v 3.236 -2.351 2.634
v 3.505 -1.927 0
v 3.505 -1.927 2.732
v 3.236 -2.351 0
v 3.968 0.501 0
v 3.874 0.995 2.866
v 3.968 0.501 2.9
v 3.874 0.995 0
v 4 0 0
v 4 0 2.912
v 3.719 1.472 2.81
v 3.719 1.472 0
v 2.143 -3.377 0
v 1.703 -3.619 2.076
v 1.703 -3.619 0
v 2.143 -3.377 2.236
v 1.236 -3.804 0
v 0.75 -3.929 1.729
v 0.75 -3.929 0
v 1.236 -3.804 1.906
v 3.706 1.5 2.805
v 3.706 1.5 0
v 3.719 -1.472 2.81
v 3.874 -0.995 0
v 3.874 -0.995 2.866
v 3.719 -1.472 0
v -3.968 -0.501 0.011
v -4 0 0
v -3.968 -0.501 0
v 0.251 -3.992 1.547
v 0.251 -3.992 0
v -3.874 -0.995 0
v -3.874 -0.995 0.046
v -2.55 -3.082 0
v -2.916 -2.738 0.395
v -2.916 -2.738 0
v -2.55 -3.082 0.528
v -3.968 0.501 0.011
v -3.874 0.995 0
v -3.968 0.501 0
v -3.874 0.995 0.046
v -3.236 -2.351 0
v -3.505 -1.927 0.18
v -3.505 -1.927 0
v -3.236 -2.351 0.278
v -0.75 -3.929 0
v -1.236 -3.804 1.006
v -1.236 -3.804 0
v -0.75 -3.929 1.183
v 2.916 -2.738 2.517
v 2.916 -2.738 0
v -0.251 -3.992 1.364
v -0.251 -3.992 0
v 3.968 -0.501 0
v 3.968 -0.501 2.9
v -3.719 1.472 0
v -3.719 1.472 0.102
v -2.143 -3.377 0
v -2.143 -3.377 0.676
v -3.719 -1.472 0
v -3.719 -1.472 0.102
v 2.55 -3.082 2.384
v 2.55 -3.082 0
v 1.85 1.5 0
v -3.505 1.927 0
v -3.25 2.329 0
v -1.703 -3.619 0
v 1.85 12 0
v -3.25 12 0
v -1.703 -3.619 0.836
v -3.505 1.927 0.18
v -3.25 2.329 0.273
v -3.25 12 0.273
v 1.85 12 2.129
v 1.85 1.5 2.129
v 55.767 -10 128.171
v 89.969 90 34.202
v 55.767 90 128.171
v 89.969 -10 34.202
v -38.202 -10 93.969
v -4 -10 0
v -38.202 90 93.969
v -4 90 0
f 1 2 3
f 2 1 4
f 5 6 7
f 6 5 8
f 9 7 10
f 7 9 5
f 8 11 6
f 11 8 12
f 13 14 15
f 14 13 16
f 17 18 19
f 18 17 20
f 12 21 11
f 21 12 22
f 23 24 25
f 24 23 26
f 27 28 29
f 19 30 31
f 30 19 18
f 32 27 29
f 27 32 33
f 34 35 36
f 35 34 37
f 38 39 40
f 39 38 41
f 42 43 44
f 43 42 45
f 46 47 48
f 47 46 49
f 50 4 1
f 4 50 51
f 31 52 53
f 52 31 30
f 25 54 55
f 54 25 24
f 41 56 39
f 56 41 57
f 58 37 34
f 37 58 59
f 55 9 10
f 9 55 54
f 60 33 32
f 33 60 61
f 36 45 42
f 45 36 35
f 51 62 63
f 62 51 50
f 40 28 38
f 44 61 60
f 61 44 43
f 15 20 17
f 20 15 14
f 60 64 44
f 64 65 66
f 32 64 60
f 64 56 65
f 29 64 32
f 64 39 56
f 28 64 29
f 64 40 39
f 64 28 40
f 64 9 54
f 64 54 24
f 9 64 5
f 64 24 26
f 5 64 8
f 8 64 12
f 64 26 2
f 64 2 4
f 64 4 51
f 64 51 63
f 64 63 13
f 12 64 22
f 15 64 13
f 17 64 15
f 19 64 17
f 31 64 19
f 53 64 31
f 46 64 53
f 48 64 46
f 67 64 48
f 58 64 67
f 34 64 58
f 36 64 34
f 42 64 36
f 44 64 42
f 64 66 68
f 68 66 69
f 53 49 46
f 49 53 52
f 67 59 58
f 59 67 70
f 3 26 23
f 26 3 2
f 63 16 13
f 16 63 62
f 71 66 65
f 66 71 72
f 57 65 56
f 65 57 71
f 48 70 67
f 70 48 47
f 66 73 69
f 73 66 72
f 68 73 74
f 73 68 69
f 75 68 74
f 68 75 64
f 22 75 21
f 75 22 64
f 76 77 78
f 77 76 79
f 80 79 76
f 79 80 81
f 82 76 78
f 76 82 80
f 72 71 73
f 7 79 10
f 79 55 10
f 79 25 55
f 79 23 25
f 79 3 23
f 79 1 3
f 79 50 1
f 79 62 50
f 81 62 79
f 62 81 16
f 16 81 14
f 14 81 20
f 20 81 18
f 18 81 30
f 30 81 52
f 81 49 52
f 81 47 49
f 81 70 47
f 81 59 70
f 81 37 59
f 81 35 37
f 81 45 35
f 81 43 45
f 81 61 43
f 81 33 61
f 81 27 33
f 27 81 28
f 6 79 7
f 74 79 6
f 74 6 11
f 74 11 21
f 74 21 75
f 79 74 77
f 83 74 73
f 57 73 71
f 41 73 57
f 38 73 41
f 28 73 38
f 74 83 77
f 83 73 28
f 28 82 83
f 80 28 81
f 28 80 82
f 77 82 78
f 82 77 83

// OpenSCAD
$fn=50;

Radius = 4;
Height = 16;
Height2 = Height-Radius;
Width = 6.5;
Thickness = 10;
GapHeight = 10.5;
GapWidth = 2.8;

difference()
{
    union()
    {
        cylinder(h=Thickness, r=Radius);
        translate([-Width/2, 0, 0])
            cube([Width, Height2, Thickness]);
    }
        
    translate([(Width-GapWidth)/2,Height2-GapHeight,0])
    {
        cube([GapWidth, GapHeight, Thickness]);
    }
}

translate([-Radius,90, 0])
    rotate([0, -70, 180])
        cube([100,100,100]);
